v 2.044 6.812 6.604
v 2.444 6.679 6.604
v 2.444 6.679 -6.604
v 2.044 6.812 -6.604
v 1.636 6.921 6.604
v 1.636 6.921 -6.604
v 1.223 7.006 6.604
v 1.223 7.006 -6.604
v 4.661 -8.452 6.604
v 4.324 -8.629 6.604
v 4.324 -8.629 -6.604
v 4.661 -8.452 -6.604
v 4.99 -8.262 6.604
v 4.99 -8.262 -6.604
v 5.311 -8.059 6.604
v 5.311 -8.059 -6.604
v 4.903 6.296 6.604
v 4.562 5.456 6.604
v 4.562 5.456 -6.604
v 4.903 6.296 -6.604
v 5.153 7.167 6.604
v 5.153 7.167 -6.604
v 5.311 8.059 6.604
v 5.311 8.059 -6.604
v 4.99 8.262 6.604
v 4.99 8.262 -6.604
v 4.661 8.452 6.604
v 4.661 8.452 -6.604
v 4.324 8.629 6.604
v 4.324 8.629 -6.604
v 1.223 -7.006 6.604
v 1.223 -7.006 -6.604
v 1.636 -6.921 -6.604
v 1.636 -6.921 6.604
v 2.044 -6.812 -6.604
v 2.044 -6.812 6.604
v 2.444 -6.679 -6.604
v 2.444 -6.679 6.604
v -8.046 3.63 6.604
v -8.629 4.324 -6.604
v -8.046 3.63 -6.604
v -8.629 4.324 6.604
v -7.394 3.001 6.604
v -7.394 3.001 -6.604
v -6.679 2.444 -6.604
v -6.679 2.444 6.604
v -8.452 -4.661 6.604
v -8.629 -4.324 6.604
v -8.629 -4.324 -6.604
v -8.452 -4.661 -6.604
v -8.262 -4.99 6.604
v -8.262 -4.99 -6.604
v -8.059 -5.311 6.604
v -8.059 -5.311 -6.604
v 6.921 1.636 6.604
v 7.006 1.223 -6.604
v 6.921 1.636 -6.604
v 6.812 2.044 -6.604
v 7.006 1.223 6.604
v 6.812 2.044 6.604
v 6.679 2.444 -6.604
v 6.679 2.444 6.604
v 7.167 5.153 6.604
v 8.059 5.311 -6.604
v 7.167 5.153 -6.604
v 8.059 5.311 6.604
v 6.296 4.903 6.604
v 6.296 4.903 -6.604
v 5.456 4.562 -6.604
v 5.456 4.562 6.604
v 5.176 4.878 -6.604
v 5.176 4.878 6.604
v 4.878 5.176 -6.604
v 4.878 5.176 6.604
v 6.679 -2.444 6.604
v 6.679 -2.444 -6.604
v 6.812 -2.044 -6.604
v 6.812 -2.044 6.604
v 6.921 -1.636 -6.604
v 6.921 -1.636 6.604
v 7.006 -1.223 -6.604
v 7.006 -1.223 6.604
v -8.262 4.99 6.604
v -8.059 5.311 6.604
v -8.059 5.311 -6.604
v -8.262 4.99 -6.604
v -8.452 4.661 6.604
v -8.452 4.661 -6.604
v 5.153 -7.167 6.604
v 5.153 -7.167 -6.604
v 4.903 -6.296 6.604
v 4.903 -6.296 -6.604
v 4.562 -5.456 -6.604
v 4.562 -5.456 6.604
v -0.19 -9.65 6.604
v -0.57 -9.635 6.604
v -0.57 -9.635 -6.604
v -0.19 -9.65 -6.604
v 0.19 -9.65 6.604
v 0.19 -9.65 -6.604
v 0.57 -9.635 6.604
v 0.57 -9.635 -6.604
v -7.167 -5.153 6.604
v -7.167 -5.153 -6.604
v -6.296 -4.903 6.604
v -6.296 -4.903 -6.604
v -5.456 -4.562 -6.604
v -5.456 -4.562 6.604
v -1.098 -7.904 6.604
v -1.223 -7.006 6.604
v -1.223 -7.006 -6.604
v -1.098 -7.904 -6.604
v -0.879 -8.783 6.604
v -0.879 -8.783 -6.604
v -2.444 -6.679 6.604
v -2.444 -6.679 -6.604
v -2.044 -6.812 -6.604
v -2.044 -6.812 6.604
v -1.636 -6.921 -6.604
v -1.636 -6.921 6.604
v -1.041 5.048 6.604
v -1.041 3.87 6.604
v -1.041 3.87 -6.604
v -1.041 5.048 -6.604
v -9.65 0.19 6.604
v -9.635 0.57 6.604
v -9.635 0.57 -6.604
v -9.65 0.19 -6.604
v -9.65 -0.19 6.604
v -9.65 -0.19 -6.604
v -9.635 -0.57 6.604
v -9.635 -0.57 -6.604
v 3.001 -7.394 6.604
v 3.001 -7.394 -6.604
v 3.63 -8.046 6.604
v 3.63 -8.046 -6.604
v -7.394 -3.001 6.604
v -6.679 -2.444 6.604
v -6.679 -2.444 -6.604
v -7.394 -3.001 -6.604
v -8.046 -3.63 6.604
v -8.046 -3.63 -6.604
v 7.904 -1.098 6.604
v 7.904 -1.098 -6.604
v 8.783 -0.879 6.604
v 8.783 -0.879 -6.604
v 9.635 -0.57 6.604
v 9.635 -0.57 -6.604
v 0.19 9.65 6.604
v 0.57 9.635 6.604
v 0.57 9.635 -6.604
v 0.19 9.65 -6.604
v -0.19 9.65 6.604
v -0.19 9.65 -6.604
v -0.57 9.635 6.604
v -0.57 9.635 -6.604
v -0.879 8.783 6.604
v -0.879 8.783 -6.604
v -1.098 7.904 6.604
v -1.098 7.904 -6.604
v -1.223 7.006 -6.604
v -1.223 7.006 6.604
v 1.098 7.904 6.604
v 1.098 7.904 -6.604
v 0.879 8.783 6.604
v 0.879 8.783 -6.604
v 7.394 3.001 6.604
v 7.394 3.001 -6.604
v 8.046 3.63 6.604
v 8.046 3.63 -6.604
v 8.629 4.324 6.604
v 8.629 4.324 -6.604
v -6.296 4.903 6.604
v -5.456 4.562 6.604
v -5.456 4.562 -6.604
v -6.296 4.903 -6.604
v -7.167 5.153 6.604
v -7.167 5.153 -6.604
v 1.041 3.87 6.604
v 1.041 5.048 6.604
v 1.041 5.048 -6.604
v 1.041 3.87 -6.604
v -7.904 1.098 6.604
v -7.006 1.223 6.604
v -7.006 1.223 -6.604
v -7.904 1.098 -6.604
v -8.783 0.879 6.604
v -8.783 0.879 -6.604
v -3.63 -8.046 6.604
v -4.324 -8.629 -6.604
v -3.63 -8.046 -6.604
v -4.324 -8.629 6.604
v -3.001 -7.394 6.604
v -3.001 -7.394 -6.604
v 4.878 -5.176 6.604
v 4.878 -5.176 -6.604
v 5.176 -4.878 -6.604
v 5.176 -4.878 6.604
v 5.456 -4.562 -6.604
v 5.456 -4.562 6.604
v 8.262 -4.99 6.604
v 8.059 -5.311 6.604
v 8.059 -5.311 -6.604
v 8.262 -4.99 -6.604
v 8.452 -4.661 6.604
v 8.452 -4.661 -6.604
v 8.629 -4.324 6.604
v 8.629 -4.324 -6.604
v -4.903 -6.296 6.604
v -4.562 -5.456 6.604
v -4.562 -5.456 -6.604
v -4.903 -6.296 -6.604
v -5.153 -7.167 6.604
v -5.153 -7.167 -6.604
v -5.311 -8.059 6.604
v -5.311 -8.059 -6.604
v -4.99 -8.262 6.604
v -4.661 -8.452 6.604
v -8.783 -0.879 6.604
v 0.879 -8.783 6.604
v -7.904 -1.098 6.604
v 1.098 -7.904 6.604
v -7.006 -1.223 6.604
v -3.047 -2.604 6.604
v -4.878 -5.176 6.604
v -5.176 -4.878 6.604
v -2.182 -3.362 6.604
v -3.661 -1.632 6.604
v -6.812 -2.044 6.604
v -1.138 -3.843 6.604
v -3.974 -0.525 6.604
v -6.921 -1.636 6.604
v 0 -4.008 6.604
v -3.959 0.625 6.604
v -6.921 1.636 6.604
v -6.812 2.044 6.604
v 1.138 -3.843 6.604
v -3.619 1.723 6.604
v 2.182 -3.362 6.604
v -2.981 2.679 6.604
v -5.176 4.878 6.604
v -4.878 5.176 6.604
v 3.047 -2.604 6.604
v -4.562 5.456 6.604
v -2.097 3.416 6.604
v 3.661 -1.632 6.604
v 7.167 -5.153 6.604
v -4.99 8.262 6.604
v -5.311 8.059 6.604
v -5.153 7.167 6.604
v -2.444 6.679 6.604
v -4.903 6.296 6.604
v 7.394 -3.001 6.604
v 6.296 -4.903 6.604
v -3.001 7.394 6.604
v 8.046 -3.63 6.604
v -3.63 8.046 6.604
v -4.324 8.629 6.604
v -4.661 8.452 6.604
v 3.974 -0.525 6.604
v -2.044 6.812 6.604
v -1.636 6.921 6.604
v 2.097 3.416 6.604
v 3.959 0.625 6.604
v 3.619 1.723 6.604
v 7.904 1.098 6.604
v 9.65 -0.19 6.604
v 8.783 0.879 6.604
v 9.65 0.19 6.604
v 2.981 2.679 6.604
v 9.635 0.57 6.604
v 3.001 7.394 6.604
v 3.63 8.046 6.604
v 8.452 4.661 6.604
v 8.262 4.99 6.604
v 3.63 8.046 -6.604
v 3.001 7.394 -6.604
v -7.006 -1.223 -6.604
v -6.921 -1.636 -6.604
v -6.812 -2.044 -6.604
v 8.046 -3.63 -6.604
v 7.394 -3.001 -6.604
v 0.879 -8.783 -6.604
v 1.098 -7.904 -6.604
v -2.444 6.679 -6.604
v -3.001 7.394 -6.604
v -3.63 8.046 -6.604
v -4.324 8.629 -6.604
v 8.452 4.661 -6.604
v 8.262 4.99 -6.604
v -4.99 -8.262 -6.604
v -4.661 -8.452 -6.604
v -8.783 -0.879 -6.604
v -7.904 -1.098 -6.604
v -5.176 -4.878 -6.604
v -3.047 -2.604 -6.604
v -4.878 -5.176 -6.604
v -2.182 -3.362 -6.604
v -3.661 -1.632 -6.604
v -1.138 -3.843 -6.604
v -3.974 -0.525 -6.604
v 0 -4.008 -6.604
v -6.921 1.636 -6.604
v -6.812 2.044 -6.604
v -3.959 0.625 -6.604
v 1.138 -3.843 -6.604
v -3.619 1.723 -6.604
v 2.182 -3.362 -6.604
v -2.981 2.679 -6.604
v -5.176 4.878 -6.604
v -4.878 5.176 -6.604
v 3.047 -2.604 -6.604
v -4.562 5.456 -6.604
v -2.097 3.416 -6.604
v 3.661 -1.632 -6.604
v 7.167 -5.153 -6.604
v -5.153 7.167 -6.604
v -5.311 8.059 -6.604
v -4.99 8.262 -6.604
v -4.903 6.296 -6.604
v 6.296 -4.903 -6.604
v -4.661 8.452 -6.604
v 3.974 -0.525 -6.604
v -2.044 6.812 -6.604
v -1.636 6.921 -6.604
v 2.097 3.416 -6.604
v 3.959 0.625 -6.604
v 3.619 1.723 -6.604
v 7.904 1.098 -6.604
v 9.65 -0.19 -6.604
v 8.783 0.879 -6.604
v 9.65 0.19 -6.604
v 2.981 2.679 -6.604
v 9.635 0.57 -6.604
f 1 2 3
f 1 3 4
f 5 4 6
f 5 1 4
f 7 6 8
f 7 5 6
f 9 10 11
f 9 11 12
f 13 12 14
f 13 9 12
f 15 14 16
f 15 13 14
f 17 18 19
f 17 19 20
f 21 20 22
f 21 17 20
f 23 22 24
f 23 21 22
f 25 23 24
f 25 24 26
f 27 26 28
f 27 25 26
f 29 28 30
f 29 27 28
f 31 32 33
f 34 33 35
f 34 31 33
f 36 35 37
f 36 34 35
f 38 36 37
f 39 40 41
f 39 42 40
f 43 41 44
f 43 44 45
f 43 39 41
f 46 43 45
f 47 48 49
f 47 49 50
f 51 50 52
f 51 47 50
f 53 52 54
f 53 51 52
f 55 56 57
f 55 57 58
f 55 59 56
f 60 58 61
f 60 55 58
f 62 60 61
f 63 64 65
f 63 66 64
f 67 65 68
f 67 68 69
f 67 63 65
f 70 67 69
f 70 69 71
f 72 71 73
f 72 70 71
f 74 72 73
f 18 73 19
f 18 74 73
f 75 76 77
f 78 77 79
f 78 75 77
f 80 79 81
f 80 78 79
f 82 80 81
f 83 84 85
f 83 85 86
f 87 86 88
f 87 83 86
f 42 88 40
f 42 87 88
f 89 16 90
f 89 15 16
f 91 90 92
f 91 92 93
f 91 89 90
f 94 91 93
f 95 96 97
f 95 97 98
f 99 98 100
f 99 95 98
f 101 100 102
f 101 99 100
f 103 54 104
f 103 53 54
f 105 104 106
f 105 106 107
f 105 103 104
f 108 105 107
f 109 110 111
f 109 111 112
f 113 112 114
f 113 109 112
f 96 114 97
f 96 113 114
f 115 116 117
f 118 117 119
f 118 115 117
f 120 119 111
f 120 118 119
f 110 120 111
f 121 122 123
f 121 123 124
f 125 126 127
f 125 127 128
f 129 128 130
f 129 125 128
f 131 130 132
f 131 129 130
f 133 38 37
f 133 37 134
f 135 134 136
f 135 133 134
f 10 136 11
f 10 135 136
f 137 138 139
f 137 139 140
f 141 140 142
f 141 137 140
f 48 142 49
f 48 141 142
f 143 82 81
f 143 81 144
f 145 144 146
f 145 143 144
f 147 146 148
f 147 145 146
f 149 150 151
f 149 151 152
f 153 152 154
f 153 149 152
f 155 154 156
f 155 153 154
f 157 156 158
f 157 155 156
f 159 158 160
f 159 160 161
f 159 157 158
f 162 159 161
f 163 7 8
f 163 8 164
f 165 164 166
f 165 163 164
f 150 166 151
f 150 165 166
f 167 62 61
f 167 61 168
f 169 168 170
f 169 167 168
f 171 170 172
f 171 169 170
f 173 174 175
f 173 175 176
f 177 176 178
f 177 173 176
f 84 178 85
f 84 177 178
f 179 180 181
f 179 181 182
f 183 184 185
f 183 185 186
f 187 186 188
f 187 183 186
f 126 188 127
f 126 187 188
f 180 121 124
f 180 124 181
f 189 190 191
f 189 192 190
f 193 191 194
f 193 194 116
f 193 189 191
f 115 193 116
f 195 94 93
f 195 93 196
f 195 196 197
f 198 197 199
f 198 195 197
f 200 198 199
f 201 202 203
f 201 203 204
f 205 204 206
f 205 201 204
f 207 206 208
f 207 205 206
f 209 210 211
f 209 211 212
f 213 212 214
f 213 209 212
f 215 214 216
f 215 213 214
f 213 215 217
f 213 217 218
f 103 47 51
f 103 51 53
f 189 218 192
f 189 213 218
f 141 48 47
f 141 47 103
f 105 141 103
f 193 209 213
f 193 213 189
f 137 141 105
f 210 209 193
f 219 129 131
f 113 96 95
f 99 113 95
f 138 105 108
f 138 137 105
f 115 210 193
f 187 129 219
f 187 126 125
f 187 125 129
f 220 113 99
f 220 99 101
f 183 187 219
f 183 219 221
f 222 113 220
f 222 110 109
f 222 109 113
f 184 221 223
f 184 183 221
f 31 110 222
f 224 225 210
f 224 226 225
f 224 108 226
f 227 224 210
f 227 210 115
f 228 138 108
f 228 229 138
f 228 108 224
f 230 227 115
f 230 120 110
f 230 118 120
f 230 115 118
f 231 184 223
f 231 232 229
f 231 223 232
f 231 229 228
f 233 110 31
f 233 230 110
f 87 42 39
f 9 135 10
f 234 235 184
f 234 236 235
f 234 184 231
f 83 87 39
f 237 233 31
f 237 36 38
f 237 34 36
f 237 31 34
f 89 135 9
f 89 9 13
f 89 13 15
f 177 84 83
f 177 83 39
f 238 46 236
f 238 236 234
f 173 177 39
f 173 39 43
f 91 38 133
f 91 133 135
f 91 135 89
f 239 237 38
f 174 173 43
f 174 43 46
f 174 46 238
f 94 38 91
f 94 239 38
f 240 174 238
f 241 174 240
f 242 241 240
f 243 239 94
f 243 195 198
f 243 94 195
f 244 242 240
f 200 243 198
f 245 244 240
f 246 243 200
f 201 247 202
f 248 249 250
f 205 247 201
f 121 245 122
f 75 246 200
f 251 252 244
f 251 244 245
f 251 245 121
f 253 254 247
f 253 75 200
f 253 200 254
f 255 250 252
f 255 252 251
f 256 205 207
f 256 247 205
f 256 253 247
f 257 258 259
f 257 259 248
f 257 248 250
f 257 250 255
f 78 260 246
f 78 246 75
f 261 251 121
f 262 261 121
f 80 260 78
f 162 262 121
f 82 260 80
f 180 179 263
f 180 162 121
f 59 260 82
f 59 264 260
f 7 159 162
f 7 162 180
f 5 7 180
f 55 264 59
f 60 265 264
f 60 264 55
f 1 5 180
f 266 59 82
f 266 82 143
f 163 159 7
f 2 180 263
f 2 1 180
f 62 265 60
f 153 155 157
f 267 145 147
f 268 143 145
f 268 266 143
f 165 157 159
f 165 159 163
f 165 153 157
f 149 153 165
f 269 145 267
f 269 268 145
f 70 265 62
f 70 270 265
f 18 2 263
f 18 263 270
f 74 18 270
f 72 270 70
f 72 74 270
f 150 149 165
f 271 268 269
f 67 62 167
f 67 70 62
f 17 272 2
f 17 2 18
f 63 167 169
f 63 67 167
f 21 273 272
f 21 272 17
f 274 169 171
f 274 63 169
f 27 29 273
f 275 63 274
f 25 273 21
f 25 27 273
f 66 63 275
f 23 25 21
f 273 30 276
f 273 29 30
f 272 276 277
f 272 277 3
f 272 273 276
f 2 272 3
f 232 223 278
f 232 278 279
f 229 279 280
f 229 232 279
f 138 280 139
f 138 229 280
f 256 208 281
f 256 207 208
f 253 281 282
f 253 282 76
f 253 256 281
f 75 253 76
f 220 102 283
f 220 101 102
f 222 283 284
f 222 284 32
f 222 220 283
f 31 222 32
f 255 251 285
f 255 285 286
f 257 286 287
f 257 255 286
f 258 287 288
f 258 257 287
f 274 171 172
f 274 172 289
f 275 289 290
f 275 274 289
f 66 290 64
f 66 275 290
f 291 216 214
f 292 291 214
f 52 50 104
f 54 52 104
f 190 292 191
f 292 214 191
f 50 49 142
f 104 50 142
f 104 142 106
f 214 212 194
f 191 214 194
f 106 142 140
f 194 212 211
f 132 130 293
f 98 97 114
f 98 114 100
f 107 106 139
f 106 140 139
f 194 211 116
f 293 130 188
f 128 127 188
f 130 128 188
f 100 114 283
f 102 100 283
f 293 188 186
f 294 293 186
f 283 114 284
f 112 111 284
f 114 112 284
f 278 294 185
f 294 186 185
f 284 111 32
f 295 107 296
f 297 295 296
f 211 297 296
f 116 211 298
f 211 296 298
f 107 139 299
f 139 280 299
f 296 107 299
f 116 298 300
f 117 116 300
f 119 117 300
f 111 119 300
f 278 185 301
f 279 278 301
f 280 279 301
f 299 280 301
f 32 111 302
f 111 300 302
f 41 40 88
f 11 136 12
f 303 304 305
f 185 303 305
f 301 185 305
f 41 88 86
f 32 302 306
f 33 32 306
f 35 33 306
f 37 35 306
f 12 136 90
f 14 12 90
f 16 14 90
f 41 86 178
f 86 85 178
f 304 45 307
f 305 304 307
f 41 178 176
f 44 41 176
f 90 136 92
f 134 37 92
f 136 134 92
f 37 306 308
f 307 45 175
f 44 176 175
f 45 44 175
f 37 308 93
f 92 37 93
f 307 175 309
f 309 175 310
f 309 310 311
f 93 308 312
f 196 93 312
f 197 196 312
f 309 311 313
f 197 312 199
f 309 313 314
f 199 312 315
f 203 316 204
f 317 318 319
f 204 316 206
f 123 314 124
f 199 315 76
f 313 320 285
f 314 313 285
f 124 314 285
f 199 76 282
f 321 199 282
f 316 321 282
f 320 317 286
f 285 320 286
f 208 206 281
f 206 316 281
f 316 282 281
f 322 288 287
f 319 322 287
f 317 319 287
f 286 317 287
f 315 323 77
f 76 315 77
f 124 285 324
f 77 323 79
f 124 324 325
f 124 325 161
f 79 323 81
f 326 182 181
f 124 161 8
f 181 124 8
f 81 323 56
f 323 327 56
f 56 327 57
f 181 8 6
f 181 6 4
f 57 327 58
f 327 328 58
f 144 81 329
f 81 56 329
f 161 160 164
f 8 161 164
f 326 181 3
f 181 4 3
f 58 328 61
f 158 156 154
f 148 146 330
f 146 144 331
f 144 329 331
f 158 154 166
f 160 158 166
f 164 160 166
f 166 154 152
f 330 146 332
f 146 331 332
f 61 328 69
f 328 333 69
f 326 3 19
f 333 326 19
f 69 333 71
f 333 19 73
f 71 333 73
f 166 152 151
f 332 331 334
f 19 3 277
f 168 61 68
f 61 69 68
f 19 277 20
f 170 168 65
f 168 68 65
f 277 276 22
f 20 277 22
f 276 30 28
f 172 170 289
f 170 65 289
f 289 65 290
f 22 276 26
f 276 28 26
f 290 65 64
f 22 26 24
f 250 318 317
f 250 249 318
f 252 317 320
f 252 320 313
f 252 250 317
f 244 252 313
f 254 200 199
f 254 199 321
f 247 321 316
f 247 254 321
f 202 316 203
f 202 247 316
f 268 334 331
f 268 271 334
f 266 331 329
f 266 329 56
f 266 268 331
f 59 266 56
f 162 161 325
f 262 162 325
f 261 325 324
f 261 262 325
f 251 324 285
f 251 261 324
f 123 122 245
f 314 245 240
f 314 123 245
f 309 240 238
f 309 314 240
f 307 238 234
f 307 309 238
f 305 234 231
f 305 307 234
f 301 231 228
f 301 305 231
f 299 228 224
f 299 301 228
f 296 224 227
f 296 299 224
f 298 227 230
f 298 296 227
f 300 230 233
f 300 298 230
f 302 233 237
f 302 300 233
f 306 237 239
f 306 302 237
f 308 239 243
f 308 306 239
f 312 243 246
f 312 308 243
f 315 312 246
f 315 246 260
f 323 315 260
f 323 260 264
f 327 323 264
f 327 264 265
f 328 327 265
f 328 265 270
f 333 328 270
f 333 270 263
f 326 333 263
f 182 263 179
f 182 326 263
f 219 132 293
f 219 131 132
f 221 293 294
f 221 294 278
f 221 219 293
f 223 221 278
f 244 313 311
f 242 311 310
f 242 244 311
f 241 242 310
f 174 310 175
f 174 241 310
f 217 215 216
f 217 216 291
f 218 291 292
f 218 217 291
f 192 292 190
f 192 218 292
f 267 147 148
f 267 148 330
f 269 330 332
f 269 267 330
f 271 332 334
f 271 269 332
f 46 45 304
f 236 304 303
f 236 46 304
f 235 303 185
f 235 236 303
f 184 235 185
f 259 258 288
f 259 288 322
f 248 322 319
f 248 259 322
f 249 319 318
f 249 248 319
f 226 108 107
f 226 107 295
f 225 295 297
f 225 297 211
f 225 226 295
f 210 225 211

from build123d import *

# Parameters (mm, degrees)
SKETCH1_R         = 7.112
SKETCH1_R_2       = 4.00812
EXTRUDE1_DEPTH    = 6.604
EXTRUDE2_DEPTH    = 6.604
CIRPATTERN1_COUNT = 12
EXTRUDE3_DEPTH    = 14.208


with BuildPart() as part:
    # Sketch1 → Extrude1 (new body, symmetric)
    with BuildSketch(Plane.XY):
        Circle(SKETCH1_R)
        Circle(SKETCH1_R_2, mode=Mode.SUBTRACT)
    extrude(amount=EXTRUDE1_DEPTH, both=True)

    # Sketch2 → Extrude2 (add, symmetric)
    with BuildSketch(Plane.XY):
        with BuildLine():
            ThreePointArc((-1.223214196, 7.006018201), (0, 7.112), (1.223214196, 7.006018201))
            ThreePointArc((1.223214196, 7.006018201), (1.000294904, 8.346410328), (0.569675744, 9.635173768))
            ThreePointArc((0.569675744, 9.635173768), (0, 9.652), (-0.569675744, 9.635173768))
            ThreePointArc((-0.569675744, 9.635173768), (-1.000294904, 8.346410328), (-1.223214196, 7.006018201))
        make_face()
    extrude2 = extrude(amount=EXTRUDE2_DEPTH, both=True)

    # CirPattern1: Extrude2 ×12 about axis
    cirpattern1_axis = Axis((0, 0, 0), (0, 0, 1))
    for i in range(1, CIRPATTERN1_COUNT):
        add(extrude2.rotate(cirpattern1_axis, i * 360 / CIRPATTERN1_COUNT))

    # Sketch3 → Extrude3 (cut, through all)
    with BuildSketch(Plane.XY.offset(6.604)):
        with BuildLine():
            Line((-1.0414, 3.870466635), (-1.0414, 5.04825))
            Line((-1.0414, 5.04825), (1.0414, 5.04825))
            Line((1.0414, 5.04825), (1.0414, 3.870466635))
            ThreePointArc((1.0414, 3.870466635), (0, 4.00812), (-1.0414, 3.870466635))
        make_face()
    extrude(amount=-EXTRUDE3_DEPTH, mode=Mode.SUBTRACT)


solid = part.part
